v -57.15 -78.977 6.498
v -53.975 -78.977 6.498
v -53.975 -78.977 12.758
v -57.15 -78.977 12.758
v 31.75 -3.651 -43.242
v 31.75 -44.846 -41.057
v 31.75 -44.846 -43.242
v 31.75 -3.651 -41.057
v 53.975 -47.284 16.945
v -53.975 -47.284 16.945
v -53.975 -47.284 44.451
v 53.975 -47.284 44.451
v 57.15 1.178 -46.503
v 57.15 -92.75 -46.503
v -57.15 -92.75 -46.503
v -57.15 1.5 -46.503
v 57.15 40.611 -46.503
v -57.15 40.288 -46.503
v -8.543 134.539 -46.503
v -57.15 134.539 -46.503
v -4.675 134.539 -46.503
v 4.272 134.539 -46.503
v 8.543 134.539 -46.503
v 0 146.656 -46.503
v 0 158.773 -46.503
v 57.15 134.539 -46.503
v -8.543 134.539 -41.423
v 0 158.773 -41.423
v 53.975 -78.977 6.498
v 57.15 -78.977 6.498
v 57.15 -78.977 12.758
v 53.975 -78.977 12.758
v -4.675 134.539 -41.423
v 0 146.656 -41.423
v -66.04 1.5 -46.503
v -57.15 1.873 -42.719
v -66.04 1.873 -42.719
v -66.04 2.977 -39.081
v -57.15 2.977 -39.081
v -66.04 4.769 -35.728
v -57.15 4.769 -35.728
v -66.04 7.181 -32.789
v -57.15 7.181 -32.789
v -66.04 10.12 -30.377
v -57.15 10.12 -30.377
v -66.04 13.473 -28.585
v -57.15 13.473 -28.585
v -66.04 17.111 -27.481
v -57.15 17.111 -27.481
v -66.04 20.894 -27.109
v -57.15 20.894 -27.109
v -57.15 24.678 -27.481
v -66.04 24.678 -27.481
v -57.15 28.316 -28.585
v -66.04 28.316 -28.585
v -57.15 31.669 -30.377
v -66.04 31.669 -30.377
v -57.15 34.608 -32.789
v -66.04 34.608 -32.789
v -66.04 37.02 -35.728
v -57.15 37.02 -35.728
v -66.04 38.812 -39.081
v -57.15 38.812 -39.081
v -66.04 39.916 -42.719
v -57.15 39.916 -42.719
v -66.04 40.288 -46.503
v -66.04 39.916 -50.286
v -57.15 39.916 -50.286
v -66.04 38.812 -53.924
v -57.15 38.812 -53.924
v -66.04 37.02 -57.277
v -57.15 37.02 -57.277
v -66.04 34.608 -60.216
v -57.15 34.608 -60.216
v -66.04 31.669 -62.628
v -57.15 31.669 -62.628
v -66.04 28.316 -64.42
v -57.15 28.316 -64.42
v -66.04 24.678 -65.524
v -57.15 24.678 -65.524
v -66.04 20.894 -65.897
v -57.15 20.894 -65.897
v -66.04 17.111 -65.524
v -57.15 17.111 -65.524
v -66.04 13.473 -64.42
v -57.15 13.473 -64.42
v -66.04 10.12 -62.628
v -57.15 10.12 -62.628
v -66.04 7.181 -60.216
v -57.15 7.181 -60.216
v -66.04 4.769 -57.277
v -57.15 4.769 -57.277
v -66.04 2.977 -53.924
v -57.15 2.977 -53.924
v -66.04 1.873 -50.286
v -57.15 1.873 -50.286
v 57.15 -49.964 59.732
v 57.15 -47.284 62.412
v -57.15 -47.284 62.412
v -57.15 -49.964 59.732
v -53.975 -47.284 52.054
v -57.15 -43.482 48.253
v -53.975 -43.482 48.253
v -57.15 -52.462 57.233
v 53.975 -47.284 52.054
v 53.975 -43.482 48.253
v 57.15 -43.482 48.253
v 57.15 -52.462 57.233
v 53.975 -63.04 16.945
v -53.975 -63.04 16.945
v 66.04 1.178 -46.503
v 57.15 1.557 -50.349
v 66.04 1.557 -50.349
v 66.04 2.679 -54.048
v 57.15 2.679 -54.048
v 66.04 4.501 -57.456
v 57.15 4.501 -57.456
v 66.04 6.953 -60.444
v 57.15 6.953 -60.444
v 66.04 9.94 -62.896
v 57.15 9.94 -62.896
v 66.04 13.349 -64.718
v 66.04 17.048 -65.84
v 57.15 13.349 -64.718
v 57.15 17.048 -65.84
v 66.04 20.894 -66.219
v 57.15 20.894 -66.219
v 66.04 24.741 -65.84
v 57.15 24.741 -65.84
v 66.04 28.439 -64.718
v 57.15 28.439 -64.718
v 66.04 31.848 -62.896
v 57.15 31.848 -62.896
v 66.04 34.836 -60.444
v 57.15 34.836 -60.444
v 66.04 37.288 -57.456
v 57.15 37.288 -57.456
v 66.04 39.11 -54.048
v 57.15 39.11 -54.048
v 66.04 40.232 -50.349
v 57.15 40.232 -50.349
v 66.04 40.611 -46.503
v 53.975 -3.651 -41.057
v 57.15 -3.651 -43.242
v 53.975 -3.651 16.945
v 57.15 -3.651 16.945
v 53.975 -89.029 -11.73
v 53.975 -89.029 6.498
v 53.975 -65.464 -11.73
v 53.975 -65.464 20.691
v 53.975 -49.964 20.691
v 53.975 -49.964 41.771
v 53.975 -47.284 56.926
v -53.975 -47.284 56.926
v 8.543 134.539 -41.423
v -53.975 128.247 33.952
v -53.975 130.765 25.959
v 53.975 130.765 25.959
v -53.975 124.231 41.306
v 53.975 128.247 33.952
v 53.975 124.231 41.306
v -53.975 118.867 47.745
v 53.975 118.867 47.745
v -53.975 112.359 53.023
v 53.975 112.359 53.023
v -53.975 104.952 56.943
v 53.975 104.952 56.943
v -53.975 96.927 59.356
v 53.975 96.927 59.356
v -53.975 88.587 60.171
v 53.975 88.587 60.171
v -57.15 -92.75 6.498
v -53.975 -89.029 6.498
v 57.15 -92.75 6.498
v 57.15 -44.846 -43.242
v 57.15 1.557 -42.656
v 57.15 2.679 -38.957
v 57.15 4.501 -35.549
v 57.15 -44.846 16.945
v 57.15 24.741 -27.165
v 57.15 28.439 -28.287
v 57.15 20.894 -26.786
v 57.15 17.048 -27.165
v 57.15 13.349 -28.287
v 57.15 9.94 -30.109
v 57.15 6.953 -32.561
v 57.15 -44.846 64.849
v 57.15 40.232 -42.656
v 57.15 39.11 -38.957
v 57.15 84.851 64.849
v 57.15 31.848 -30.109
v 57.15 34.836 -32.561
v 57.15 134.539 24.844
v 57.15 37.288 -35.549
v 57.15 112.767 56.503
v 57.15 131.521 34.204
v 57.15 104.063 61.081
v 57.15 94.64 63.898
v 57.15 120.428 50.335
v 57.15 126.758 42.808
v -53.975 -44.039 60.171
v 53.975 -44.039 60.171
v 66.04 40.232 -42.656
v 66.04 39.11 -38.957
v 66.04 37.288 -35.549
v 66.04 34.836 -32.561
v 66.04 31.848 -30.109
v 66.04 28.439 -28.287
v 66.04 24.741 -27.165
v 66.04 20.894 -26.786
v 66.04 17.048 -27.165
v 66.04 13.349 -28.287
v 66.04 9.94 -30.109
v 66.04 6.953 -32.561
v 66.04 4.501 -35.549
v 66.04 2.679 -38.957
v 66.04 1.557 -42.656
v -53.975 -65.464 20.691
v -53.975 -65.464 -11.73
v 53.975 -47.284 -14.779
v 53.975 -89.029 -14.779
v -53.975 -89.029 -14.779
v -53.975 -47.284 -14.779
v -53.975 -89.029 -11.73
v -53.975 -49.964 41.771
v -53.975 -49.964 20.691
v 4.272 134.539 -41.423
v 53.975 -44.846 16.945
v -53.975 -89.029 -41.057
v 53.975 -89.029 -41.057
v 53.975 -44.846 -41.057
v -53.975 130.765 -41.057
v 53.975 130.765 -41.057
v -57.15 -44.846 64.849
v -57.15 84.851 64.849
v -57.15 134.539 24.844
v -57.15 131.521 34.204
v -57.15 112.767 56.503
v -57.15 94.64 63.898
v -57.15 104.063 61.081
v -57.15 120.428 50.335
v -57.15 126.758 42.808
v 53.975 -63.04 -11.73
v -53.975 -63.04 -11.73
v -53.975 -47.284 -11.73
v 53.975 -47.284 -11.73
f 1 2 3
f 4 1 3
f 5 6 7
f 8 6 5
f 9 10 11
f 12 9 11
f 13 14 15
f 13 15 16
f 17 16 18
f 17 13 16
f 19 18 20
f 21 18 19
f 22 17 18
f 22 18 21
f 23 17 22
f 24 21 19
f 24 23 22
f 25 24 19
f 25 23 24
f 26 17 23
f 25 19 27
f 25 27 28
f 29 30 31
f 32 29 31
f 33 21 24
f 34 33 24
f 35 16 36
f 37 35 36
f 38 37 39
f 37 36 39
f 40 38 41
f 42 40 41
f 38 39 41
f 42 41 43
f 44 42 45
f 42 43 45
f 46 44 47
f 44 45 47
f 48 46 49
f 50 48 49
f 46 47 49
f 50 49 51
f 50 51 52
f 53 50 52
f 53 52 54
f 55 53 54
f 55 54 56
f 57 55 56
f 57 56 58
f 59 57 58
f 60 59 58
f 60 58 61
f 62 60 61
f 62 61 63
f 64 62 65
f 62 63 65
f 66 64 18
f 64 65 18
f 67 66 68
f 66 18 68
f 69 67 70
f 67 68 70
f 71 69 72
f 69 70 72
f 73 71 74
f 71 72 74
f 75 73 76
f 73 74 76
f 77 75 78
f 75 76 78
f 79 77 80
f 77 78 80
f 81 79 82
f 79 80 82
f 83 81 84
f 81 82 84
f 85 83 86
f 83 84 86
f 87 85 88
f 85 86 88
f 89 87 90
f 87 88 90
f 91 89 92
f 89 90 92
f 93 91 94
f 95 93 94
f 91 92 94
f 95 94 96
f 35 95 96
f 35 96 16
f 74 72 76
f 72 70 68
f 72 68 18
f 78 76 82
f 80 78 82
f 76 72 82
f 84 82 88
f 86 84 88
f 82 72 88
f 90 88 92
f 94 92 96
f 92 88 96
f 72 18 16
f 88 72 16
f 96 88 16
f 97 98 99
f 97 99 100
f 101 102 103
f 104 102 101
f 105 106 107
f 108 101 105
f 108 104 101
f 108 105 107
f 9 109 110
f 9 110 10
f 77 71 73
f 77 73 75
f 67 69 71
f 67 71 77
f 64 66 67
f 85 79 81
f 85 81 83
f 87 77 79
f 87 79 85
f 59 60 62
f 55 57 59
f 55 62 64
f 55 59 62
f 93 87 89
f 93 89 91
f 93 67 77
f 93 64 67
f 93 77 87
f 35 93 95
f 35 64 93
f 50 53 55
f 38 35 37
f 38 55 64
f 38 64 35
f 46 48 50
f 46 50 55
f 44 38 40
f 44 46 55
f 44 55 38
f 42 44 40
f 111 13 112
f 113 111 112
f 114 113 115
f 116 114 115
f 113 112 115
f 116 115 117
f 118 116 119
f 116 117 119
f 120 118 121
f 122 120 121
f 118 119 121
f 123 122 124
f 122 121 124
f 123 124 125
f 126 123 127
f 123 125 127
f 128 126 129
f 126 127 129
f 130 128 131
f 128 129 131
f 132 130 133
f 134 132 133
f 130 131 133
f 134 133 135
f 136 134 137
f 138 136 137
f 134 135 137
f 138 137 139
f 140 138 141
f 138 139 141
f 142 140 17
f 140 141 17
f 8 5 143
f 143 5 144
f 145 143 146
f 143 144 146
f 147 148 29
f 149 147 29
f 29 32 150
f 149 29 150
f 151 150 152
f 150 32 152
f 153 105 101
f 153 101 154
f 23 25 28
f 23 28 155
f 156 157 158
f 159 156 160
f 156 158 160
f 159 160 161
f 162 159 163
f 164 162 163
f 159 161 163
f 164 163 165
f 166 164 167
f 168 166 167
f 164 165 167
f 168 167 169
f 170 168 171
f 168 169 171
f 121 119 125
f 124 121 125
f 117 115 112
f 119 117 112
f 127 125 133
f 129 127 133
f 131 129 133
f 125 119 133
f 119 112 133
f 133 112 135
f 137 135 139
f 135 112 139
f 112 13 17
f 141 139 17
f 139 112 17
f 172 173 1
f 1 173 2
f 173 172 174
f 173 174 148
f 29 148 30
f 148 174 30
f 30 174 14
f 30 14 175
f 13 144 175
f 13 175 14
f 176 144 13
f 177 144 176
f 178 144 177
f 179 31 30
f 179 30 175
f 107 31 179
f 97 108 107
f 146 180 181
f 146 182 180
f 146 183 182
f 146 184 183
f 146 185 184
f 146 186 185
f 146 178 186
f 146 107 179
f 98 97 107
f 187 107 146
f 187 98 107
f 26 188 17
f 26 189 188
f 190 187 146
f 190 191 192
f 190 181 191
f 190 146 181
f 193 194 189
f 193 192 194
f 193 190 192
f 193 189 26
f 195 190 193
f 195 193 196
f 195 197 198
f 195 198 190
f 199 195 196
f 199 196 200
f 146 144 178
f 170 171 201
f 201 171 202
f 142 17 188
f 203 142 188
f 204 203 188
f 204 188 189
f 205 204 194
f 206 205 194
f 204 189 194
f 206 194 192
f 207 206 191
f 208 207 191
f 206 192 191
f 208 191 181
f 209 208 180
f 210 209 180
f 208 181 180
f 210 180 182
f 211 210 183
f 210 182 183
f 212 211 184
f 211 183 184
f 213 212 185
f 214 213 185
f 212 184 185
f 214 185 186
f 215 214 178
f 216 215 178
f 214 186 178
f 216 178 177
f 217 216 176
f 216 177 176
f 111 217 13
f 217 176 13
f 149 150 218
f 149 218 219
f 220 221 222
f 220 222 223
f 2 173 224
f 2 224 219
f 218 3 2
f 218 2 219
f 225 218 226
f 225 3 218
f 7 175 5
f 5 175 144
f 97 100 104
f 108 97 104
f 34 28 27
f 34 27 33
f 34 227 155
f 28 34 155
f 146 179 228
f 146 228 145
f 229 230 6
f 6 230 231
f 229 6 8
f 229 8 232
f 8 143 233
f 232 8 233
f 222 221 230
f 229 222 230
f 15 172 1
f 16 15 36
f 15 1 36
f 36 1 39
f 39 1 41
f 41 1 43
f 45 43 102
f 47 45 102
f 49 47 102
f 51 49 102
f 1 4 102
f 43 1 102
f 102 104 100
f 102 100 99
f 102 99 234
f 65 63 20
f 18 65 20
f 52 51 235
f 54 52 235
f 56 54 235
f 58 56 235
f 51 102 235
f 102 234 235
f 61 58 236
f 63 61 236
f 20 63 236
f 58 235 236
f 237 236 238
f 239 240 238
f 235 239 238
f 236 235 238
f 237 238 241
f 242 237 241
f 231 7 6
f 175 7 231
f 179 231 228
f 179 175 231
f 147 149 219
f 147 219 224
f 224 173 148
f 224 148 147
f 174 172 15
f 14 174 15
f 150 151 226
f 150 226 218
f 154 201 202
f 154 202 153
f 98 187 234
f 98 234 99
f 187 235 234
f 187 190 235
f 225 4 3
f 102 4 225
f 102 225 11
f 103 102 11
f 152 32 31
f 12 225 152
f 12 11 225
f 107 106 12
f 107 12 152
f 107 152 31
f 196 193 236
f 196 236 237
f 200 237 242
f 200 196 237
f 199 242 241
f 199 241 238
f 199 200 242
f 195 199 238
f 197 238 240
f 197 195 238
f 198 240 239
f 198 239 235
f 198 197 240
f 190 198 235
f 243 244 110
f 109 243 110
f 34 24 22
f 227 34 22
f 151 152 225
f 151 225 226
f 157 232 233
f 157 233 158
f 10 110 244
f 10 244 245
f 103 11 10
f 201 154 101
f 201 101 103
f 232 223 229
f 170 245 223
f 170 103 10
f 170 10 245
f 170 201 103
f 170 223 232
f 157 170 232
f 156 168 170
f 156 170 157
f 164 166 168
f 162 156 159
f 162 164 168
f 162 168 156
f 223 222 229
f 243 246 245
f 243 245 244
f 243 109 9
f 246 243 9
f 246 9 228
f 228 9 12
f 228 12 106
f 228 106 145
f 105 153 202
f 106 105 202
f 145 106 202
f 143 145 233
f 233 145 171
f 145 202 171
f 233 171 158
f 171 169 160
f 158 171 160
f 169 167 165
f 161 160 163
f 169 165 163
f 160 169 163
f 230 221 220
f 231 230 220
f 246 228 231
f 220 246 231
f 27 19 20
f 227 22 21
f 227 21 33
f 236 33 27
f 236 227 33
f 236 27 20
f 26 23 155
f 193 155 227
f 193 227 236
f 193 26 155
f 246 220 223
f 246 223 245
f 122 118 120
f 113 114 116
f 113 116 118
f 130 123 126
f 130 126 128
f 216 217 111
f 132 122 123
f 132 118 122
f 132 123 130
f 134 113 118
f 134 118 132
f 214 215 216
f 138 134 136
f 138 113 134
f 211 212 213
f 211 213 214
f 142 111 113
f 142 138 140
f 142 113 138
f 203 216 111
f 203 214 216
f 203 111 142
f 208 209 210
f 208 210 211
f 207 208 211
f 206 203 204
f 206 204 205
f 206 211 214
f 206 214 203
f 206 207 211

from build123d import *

# Parameters (mm, degrees)
F1_DEPTH  = 57.15
F3_DEPTH  = 5.08
F5_DEPTH  = 41.402
F7_DEPTH  = 53.975
F8_W      = 41.1952470895
F8_H      = 60.1872038096
F9_DEPTH  = 25.4
F11_DEPTH = 114.3
F12_W     = 114.3
F12_H     = 56.9759604018
F13_DEPTH = 12.7
F15_DEPTH = 114.3
F17_DEPTH = 8.89
F18_R     = 19.3940377175
F19_DEPTH = 8.89


with BuildPart() as f1:
    # F0 (on Right) → F1 (new body, symmetric)
    with BuildSketch(Plane.YZ):
        with BuildLine():
            Line((-92.7504450083, 16.9447939843), (-92.7504450083, -46.5026274323))
            Line((-92.7504450083, -46.5026274323), (134.5391124487, -46.5026274323))
            Line((134.5391124487, -46.5026274323), (134.5391124487, 24.8438697308))
            ThreePointArc((134.5391124487, 24.8438697308), (116.7467916318, 53.6046661319), (84.8513692617, 64.848870039))
            Line((84.8513692617, 64.848870039), (-44.8463708162, 64.848870039))
            Line((-44.8463708162, 64.848870039), (-92.7504450083, 16.9447939843))
        make_face()
    extrude(amount=F1_DEPTH, both=True)

    # F2 (on face) → F3 (join)
    with BuildSketch(Plane(origin=(0, 0, -46.5026274323), x_dir=(1, 0, 0), z_dir=(0, 0, -1))):
        Polygon((-28.575, -77.7167230844), (0, -134.5391124487), (28.575, -77.7167230844), (57.15, -20.8943337202), (-57.15, -20.8943337202), align=None)
        Polygon((28.575, -77.7167230844), (0, -134.5391124487), (8.5433015109, -134.5391124487), align=None)
        Polygon((-8.5433015109, -134.5391124487), (0, -134.5391124487), (-28.575, -77.7167230844), align=None)
        Polygon((8.5433015109, -134.5391124487), (0, -134.5391124487), (-8.5433015109, -134.5391124487), (0, -158.7732434273), align=None)
    extrude(amount=-F3_DEPTH)

    # F4 (on face) → F5 (cut)
    with BuildSketch(Plane(origin=(0, 0, -46.5026274323), x_dir=(1, 0, 0), z_dir=(0, 0, -1))):
        Polygon((-4.6747997403, -134.5391124487), (0, -146.656177938), (4.2716507554, -134.5391124487), align=None)
    extrude(amount=-F5_DEPTH, mode=Mode.SUBTRACT)

    # F6 (on Right) → F7 (cut, symmetric)
    with BuildSketch(Plane.YZ):
        with BuildLine():
            Line((-89.0294536948, 15.1805384085), (-89.0294536948, -41.0569272935))
            Line((-89.0294536948, -41.0569272935), (130.7652890682, -41.0569272935))
            Line((130.7652890682, -41.0569272935), (130.7652890682, 25.959385559))
            ThreePointArc((130.7652890682, 25.959385559), (115.7413511895, 50.5424798047), (88.5871946812, 60.1705126464))
            Line((88.5871946812, 60.1705126464), (-44.0394952893, 60.1705126464))
            Line((-44.0394952893, 60.1705126464), (-89.0294536948, 15.1805384085))
        make_face()
    extrude(amount=F7_DEPTH, both=True, mode=Mode.SUBTRACT)

    # F8 (on face) → F9 (cut, symmetric)
    with BuildSketch(Plane.YZ.offset(57.15)):
        with Locations((-24.2487472715, -13.1488079205)):
            Rectangle(F8_W, F8_H)
    extrude(amount=F9_DEPTH, both=True, mode=Mode.SUBTRACT)

    # F10 (on face) → F11 (join)
    with BuildSketch(Plane.YZ.offset(57.15)):
        Polygon((-92.7504450083, -11.7301335558), (-92.7504450083, -14.778916724), (-47.2835078835, -14.778916724), (-47.2835078835, -11.7301335558), (-63.0396455526, -11.7301335558), (-63.0396455526, 16.9447939843), (-47.2835078835, 16.9447939843), (-47.2835078835, 62.4117328769), (-49.9636399546, 59.7316007017), (-49.9636399546, 20.691152662), (-65.4636770487, 20.691152662), (-65.4636770487, -11.7301335558), align=None)
    extrude(amount=-F11_DEPTH)

    # F12 (on face) → F13 (cut)
    with BuildSketch(Plane(origin=(0, -54.8476212995, 54.8476191669), x_dir=(1, 0, 0), z_dir=(0, -0.7071067949, 0.7071067674))):
        with Locations((0, -25.1147081824)):
            Rectangle(F12_W, F12_H)
    extrude(amount=-F13_DEPTH, mode=Mode.SUBTRACT)

    # F14 (on face) → F15 (cut)
    with BuildSketch(Plane.YZ.offset(57.15)):
        Polygon((-92.7504450083, 16.9447939843), (-92.7504450083, 6.4976271242), (-78.9771229029, 6.4976271242), (-78.9771229029, 12.7576040339), (-83.7701887126, 7.9645380378), align=None)
    extrude(amount=-F15_DEPTH, mode=Mode.SUBTRACT)

    # F16 (on face) → F17 (join)
    with BuildSketch(Plane.YZ.offset(57.15)):
        with BuildLine():
            Line((20.8943337202, -46.5026274323), (40.6107781849, -46.5026274323))
            ThreePointArc((40.6107781849, -46.5026274323), (20.8943337202, -26.7861829676), (1.1778892555, -46.5026274323))
            Line((1.1778892555, -46.5026274323), (20.8943337202, -46.5026274323))
        make_face()
        with BuildLine():
            ThreePointArc((1.1778892555, -46.5026274323), (20.8943337202, -66.2190718971), (40.6107781849, -46.5026274323))
            Line((40.6107781849, -46.5026274323), (20.8943337202, -46.5026274323))
            Line((20.8943337202, -46.5026274323), (1.1778892555, -46.5026274323))
        make_face()
    extrude(amount=F17_DEPTH)

    # F18 (on face) → F19 (join)
    with BuildSketch(Plane(origin=(-57.15, 0, 0), x_dir=(0, -1, 0), z_dir=(-1, 0, 0))):
        with Locations((-20.8943337202, -46.5026274323)):
            Circle(F18_R)
    extrude(amount=F19_DEPTH)


solid = f1.part
